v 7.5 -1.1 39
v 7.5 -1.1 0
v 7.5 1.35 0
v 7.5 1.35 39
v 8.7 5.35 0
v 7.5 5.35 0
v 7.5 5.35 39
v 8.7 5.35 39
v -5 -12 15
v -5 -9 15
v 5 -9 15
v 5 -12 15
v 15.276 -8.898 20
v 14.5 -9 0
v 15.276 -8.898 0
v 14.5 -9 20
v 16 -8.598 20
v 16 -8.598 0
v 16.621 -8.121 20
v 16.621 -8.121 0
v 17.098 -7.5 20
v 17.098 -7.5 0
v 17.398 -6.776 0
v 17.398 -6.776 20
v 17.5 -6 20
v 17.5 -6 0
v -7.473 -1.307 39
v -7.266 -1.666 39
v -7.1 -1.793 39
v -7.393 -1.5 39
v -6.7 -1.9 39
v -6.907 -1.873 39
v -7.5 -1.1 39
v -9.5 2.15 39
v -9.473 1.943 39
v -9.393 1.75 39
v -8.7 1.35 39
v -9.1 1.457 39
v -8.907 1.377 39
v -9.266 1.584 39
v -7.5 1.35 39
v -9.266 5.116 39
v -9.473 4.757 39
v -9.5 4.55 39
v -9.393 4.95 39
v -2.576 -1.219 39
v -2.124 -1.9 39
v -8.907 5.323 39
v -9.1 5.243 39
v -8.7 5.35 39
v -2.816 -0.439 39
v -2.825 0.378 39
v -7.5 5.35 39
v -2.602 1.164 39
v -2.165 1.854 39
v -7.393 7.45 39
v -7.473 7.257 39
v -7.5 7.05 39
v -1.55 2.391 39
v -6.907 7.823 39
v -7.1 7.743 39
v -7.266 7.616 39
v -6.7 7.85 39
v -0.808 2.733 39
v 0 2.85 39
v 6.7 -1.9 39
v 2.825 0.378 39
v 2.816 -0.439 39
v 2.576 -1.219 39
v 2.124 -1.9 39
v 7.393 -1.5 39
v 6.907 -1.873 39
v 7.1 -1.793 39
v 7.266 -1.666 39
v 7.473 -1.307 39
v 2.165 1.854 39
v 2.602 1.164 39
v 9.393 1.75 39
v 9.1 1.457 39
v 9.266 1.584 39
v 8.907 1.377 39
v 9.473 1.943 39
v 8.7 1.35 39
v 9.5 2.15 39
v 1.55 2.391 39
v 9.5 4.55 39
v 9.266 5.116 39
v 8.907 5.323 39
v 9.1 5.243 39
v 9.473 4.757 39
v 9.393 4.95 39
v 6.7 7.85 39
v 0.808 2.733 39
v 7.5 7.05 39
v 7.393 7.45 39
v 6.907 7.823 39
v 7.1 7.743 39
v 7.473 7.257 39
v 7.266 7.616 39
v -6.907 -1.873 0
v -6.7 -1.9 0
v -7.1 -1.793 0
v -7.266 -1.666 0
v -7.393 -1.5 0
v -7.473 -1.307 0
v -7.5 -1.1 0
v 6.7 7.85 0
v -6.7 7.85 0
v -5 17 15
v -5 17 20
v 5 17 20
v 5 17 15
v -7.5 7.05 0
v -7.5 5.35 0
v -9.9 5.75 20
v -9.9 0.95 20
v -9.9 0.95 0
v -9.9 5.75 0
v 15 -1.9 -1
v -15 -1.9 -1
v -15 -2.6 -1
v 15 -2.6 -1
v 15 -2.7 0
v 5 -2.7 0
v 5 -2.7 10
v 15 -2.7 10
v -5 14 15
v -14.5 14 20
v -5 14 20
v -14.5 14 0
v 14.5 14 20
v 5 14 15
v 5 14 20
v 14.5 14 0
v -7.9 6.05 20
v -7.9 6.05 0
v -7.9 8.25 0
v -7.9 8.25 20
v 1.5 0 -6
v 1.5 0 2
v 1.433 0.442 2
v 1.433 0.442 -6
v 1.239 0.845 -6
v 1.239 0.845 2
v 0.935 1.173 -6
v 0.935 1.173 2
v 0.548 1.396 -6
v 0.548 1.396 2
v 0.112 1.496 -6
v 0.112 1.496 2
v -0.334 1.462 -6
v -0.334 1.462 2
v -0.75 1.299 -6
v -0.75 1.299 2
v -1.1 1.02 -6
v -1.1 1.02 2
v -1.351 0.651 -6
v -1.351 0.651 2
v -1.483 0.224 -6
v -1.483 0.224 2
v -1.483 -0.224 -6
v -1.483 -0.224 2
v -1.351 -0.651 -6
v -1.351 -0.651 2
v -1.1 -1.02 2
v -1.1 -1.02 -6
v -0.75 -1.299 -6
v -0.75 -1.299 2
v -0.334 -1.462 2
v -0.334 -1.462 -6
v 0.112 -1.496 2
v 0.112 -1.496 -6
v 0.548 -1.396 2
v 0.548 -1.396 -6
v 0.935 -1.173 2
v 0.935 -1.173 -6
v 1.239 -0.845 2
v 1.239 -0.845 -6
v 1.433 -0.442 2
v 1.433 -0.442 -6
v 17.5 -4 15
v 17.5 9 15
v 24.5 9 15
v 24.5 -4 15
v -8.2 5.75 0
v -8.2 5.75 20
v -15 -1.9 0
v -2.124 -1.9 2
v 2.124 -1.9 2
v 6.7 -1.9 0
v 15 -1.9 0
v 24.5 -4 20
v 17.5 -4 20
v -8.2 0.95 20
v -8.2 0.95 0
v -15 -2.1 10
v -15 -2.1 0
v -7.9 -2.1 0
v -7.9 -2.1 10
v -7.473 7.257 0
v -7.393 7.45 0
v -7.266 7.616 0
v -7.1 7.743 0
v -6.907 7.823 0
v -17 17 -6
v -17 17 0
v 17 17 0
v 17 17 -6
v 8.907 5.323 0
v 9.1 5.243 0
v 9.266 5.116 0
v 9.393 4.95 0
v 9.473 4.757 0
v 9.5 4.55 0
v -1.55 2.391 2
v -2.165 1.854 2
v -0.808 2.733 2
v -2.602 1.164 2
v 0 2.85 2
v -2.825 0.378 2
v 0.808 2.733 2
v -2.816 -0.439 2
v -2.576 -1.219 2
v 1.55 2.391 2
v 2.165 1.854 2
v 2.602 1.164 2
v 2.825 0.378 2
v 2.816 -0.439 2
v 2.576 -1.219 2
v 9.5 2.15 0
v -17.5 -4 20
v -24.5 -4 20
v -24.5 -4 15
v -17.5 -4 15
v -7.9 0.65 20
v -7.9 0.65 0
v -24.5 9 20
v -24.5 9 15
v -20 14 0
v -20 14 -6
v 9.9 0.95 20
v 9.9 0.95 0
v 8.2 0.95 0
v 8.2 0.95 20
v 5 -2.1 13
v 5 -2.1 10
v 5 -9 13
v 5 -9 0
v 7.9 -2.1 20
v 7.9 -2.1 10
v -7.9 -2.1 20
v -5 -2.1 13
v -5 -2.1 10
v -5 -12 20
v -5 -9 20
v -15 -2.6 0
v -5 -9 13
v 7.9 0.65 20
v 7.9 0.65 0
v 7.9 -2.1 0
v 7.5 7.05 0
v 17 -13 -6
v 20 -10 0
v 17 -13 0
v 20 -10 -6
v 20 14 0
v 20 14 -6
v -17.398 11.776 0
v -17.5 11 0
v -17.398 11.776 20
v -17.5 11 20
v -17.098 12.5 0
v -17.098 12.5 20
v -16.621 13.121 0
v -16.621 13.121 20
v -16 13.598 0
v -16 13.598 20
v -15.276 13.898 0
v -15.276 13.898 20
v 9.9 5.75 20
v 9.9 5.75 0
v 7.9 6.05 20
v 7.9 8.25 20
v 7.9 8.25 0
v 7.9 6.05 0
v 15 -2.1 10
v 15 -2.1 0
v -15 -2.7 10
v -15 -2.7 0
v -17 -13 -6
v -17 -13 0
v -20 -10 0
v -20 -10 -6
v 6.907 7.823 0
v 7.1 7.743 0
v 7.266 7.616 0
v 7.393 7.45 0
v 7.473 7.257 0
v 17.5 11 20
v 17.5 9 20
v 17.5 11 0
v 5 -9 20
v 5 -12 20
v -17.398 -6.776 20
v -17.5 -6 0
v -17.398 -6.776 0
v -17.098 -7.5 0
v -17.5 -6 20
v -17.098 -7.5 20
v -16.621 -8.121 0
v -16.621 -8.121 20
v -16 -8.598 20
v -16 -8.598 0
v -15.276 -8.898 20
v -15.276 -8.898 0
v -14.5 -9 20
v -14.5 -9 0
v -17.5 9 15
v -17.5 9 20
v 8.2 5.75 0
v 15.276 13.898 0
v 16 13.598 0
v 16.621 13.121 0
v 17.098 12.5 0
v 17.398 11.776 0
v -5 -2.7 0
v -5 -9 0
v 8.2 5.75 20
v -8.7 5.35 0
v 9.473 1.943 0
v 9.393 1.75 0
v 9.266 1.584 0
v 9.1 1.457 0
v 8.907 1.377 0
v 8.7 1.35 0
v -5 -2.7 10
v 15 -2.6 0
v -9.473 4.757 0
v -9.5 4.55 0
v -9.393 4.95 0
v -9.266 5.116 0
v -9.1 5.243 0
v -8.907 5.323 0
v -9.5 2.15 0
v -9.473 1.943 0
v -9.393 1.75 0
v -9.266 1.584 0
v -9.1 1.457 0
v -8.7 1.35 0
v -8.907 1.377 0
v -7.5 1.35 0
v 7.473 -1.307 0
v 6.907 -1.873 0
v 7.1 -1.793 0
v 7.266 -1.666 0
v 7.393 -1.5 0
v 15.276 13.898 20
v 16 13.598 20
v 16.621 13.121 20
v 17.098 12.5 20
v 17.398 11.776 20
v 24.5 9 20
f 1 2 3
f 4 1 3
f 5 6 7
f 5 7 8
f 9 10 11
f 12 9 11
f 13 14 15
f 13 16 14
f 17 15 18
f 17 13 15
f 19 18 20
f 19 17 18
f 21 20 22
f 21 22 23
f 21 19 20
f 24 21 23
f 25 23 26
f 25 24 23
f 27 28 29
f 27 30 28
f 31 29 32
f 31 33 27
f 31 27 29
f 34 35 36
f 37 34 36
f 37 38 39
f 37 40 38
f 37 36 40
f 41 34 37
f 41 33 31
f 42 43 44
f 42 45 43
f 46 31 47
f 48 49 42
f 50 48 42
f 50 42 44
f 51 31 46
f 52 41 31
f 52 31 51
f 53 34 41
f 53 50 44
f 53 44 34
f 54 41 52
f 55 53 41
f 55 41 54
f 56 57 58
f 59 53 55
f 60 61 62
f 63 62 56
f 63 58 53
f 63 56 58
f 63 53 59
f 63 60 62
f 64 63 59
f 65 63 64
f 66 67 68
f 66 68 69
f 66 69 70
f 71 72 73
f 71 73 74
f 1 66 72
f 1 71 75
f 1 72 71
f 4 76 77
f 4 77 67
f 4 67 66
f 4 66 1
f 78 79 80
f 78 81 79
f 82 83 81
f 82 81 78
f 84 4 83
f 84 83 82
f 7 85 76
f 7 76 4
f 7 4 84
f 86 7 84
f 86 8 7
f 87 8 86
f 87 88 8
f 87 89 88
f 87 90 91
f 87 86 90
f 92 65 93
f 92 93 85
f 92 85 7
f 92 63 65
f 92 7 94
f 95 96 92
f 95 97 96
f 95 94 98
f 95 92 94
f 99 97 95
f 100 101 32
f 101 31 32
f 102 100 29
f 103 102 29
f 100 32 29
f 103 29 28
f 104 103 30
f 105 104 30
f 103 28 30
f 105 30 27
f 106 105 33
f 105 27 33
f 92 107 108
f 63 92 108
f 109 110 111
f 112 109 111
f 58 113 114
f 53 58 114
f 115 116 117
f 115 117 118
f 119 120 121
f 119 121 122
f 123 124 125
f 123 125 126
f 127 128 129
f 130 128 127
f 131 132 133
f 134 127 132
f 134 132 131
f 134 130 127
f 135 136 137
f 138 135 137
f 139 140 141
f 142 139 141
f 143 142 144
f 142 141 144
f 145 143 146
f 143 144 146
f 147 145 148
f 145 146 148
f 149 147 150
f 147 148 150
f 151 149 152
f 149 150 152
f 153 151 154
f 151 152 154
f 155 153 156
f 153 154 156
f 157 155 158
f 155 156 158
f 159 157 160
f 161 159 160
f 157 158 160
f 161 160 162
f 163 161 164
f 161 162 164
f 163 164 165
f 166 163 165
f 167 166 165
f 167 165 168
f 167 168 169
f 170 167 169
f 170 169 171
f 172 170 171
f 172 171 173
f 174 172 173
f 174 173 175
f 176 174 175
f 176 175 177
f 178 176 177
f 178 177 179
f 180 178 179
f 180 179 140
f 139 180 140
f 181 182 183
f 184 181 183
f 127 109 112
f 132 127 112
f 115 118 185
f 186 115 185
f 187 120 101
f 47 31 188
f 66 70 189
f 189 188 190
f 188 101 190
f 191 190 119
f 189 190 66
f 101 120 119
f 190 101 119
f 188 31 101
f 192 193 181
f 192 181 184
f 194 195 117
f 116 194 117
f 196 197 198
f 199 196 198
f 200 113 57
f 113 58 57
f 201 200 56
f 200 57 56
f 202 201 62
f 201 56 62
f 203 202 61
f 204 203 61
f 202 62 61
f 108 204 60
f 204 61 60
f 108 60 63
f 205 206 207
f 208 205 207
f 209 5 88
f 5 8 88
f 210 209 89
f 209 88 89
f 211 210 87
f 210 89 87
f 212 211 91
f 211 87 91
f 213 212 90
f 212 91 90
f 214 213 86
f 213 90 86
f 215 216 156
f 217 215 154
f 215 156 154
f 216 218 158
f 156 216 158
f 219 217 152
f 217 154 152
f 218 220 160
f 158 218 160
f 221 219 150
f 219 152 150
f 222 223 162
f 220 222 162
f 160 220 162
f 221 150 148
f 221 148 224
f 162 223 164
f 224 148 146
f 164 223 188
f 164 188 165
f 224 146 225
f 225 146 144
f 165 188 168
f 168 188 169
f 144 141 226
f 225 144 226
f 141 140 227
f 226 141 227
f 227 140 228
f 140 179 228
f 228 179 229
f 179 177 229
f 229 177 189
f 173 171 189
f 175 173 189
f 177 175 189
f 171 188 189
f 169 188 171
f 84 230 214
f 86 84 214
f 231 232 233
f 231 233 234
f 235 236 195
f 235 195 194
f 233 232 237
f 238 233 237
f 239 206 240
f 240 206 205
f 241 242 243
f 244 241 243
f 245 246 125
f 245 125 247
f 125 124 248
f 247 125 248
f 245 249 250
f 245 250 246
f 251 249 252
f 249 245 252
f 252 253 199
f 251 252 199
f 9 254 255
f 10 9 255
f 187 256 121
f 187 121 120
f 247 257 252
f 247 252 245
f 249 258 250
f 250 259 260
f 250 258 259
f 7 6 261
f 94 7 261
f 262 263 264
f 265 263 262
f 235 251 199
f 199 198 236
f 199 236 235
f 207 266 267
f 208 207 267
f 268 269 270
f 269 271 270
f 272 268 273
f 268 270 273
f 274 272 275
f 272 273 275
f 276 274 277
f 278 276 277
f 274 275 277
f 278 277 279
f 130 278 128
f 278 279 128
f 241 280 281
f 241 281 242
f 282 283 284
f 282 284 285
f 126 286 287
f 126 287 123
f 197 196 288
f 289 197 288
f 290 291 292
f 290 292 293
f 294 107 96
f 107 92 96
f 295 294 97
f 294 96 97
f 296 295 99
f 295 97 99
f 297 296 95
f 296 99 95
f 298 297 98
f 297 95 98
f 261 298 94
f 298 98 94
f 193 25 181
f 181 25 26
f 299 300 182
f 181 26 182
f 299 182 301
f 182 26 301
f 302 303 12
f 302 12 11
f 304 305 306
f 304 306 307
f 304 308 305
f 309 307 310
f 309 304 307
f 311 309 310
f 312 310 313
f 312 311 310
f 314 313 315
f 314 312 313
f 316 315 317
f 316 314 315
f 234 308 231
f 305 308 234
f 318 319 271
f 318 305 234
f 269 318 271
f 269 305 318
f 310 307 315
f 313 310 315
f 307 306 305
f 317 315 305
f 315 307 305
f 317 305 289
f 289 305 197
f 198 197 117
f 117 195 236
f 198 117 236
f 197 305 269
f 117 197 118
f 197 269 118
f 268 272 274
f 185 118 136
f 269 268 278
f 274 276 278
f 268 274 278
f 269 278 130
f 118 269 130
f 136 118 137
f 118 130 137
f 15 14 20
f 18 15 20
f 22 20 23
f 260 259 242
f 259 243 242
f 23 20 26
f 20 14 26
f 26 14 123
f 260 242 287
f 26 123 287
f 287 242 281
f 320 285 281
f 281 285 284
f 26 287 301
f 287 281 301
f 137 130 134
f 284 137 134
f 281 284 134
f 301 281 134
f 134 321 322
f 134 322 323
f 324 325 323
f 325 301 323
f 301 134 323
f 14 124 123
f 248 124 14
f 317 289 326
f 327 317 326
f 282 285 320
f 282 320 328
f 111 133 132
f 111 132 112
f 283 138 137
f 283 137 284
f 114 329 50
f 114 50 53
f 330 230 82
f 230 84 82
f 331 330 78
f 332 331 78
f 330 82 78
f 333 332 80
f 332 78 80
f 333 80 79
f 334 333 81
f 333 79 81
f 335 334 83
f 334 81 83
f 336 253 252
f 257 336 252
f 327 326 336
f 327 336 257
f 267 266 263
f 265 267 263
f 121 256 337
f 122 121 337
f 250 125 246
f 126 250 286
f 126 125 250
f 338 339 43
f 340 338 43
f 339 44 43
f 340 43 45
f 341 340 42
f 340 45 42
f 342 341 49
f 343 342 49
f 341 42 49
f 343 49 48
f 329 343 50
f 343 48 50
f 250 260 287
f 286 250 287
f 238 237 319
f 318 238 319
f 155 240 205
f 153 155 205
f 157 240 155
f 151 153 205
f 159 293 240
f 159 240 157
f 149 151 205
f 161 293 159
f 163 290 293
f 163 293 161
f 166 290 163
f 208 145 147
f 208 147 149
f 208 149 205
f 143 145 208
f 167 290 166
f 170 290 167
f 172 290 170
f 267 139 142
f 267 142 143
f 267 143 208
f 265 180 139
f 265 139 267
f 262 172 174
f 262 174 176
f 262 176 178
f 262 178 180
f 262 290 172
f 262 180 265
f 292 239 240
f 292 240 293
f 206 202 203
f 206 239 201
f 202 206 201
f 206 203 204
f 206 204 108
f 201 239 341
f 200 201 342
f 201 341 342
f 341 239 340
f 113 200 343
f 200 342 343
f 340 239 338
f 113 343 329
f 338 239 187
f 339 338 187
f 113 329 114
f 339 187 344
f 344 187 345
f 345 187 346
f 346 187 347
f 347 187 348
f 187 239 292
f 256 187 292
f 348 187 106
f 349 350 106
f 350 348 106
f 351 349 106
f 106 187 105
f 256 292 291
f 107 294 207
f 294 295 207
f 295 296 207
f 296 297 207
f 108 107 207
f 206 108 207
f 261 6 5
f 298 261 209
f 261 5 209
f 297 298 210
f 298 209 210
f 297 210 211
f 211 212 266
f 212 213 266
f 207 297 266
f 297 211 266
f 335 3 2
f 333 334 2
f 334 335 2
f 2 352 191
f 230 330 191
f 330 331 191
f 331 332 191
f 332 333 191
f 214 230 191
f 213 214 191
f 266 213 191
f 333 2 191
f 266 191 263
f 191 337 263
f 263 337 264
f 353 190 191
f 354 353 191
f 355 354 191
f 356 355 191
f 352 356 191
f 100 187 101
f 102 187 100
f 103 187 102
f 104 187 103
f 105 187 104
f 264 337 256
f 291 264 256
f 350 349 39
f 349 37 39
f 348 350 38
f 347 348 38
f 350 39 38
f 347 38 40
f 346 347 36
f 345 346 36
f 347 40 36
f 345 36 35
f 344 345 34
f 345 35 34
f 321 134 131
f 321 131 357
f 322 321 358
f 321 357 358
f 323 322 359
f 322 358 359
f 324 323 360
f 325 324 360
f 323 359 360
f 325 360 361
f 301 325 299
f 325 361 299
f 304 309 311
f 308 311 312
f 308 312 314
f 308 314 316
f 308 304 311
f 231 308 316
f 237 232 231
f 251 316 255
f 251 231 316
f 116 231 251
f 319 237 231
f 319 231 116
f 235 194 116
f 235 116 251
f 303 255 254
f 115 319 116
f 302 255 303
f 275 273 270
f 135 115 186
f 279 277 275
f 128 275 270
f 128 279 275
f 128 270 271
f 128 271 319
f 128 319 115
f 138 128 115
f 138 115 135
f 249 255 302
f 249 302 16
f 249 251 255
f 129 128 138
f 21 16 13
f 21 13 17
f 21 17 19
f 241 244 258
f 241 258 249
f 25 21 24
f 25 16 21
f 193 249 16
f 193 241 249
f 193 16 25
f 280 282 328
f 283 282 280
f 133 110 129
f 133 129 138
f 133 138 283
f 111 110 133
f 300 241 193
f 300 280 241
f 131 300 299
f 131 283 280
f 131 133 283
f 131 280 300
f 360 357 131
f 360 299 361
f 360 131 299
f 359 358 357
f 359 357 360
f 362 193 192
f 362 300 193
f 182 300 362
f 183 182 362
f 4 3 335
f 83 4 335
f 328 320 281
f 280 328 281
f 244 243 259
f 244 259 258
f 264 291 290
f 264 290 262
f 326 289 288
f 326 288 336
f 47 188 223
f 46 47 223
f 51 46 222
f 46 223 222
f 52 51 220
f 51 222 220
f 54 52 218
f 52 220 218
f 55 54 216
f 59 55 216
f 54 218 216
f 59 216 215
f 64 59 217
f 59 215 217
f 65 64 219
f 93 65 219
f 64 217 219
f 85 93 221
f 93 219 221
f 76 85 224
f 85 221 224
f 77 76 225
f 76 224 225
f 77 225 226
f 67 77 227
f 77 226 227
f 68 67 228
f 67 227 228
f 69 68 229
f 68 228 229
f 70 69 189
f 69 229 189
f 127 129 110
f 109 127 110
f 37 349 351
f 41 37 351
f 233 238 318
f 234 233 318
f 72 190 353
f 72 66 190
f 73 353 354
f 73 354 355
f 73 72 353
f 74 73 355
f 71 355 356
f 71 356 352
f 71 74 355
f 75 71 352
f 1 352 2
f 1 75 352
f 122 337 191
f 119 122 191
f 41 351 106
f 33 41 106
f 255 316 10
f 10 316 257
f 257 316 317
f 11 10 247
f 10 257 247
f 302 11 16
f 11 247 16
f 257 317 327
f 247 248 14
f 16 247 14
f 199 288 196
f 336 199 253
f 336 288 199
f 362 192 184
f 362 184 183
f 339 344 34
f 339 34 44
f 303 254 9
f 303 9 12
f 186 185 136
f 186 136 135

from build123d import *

# Parameters (mm, degrees)
F1_DEPTH  = 39
F2_W      = 40
F2_H      = 30
F3_DEPTH  = 6
F4_W      = 2
F4_H      = 4
F5_DEPTH  = 39
F6_R      = 0.8
F7_W      = 35
F7_H      = 23
F8_DEPTH  = 20
F9_R      = 3
F10_W     = 10
F10_H     = 3
F11_DEPTH = 5
F12_SIZE  = 3
F13_W     = 30
F13_H     = 0.6
F14_DEPTH = 10
F15_W     = 10
F15_H     = 15
F16_DEPTH = 13
F17_W     = 30
F17_H     = 0.7
F18_DEPTH = 1
F19_DEPTH = 2
F20_R     = 1.5
F21_DEPTH = 25
F22_W     = 7
F22_H     = 13
F23_DEPTH = 5
F24_SIZE  = 0.3


with BuildPart() as f1:
    # F0 (on Top) → F1 (new body)
    with BuildSketch(Plane.XY):
        with BuildLine():
            Line((7.5, 7.85), (-7.5, 7.85))
            Line((-7.5, 7.85), (-7.5, -1.9))
            Line((-7.5, -1.9), (-2.1242645786, -1.9))
            ThreePointArc((-2.1242645786, -1.9), (0, 2.85), (2.1242645786, -1.9))
            Line((2.1242645786, -1.9), (7.5, -1.9))
            Line((7.5, -1.9), (7.5, 7.85))
        make_face()
    extrude(amount=F1_DEPTH)

    # F2 (on face) → F3 (join)
    with BuildSketch(Plane(origin=(0, 0, 0), x_dir=(1, 0, 0), z_dir=(0, 0, -1))):
        with Locations((0, -2)):
            Rectangle(F2_W, F2_H)
    extrude(amount=F3_DEPTH)

    # F4 (on face) → F5 (join, through all)
    with BuildSketch(Plane.XY):
        with Locations((-8.5, 3.35)):
            Rectangle(F4_W, F4_H)
        with Locations((8.5, 3.35)):
            Rectangle(F4_W, F4_H)
    extrude(amount=F5_DEPTH)

    # F6
    f6_edges = [f1.edges().sort_by_distance(p)[0] for p in [
        (-7.5, -1.9, 19.5),
        (7.5, -1.9, 19.5),
        (7.5, 7.85, 19.5),
        (-7.5, 7.85, 19.5),
        (-9.5, 5.35, 19.5),
        (-9.5, 1.35, 19.5),
        (9.5, 1.35, 19.5),
        (9.5, 5.35, 19.5),
    ]]
    fillet(f6_edges, radius=F6_R)

    # F12
    f12_edges = [f1.edges().sort_by_distance(p)[0] for p in [
        (-20, -13, -3),
        (20, -13, -3),
        (20, 17, -3),
        (-20, 17, -3),
    ]]
    chamfer(f12_edges, length=F12_SIZE)

    # F17 (on face) → F18 (cut)
    with BuildSketch(Plane.XY):
        with Locations((0, -2.25)):
            Rectangle(F17_W, F17_H)
    extrude(amount=-F18_DEPTH, mode=Mode.SUBTRACT)

    # F19 (add): a face of the model
    f19_faces = [f1.faces().sort_by_distance(p)[0] for p in [
        (0, 0.2812457246, 0),
    ]]
    extrude(f19_faces, amount=F19_DEPTH)

    # F20 (on face) → F21 (cut)
    with BuildSketch(Plane.XY.offset(2)):
        Circle(F20_R)
    extrude(amount=-F21_DEPTH, mode=Mode.SUBTRACT)


with BuildPart() as f8:
    # F7 (on face) → F8 (new body)
    with BuildSketch(Plane.XY):
        with Locations((0, 2.5)):
            Rectangle(F7_W, F7_H)
        Polygon((-7.9, 5.75), (-7.9, 8.25), (7.9, 8.25), (7.9, 5.75), (9.9, 5.75), (9.9, 0.95), (7.9, 0.95), (7.9, -2.1), (-7.9, -2.1), (-7.9, 0.95), (-9.9, 0.95), (-9.9, 5.75), align=None, mode=Mode.SUBTRACT)
    extrude(amount=F8_DEPTH)

    # F9
    f9_edges = [f8.edges().sort_by_distance(p)[0] for p in [
        (17.5, 14, 10),
        (-17.5, 14, 10),
        (-17.5, -9, 10),
        (17.5, -9, 10),
    ]]
    fillet(f9_edges, radius=F9_R)

    # F10 (on face) → F11 (join)
    with BuildSketch(Plane.XY.offset(20)):
        with Locations((0, 15.5)):
            Rectangle(F10_W, F10_H)
        with Locations((0, -10.5)):
            Rectangle(F10_W, F10_H)
    extrude(amount=-F11_DEPTH)

    # F13 (on face) → F14 (cut)
    with BuildSketch(Plane(origin=(0, 0, 0), x_dir=(1, 0, 0), z_dir=(0, 0, -1))):
        with Locations((0, 2.4)):
            Rectangle(F13_W, F13_H)
    extrude(amount=-F14_DEPTH, mode=Mode.SUBTRACT)

    # F15 (on face) → F16 (cut)
    with BuildSketch(Plane(origin=(0, 0, 0), x_dir=(1, 0, 0), z_dir=(0, 0, -1))):
        with Locations((0, 7.5)):
            Rectangle(F15_W, F15_H)
    extrude(amount=-F16_DEPTH, mode=Mode.SUBTRACT)

    # F22 (on face) → F23 (join)
    with BuildSketch(Plane.XY.offset(20)):
        with Locations((-21, 2.5)):
            Rectangle(F22_W, F22_H)
        with Locations((21, 2.5)):
            Rectangle(F22_W, F22_H)
    extrude(amount=-F23_DEPTH)

    # F24
    f24_edges = [f8.edges().sort_by_distance(p)[0] for p in [
        (-7.9, 5.75, 10),
        (7.9, 5.75, 10),
        (-7.9, 0.95, 10),
        (7.9, 0.95, 10),
    ]]
    chamfer(f24_edges, length=F24_SIZE)


solid = Compound([f1.part, f8.part])
